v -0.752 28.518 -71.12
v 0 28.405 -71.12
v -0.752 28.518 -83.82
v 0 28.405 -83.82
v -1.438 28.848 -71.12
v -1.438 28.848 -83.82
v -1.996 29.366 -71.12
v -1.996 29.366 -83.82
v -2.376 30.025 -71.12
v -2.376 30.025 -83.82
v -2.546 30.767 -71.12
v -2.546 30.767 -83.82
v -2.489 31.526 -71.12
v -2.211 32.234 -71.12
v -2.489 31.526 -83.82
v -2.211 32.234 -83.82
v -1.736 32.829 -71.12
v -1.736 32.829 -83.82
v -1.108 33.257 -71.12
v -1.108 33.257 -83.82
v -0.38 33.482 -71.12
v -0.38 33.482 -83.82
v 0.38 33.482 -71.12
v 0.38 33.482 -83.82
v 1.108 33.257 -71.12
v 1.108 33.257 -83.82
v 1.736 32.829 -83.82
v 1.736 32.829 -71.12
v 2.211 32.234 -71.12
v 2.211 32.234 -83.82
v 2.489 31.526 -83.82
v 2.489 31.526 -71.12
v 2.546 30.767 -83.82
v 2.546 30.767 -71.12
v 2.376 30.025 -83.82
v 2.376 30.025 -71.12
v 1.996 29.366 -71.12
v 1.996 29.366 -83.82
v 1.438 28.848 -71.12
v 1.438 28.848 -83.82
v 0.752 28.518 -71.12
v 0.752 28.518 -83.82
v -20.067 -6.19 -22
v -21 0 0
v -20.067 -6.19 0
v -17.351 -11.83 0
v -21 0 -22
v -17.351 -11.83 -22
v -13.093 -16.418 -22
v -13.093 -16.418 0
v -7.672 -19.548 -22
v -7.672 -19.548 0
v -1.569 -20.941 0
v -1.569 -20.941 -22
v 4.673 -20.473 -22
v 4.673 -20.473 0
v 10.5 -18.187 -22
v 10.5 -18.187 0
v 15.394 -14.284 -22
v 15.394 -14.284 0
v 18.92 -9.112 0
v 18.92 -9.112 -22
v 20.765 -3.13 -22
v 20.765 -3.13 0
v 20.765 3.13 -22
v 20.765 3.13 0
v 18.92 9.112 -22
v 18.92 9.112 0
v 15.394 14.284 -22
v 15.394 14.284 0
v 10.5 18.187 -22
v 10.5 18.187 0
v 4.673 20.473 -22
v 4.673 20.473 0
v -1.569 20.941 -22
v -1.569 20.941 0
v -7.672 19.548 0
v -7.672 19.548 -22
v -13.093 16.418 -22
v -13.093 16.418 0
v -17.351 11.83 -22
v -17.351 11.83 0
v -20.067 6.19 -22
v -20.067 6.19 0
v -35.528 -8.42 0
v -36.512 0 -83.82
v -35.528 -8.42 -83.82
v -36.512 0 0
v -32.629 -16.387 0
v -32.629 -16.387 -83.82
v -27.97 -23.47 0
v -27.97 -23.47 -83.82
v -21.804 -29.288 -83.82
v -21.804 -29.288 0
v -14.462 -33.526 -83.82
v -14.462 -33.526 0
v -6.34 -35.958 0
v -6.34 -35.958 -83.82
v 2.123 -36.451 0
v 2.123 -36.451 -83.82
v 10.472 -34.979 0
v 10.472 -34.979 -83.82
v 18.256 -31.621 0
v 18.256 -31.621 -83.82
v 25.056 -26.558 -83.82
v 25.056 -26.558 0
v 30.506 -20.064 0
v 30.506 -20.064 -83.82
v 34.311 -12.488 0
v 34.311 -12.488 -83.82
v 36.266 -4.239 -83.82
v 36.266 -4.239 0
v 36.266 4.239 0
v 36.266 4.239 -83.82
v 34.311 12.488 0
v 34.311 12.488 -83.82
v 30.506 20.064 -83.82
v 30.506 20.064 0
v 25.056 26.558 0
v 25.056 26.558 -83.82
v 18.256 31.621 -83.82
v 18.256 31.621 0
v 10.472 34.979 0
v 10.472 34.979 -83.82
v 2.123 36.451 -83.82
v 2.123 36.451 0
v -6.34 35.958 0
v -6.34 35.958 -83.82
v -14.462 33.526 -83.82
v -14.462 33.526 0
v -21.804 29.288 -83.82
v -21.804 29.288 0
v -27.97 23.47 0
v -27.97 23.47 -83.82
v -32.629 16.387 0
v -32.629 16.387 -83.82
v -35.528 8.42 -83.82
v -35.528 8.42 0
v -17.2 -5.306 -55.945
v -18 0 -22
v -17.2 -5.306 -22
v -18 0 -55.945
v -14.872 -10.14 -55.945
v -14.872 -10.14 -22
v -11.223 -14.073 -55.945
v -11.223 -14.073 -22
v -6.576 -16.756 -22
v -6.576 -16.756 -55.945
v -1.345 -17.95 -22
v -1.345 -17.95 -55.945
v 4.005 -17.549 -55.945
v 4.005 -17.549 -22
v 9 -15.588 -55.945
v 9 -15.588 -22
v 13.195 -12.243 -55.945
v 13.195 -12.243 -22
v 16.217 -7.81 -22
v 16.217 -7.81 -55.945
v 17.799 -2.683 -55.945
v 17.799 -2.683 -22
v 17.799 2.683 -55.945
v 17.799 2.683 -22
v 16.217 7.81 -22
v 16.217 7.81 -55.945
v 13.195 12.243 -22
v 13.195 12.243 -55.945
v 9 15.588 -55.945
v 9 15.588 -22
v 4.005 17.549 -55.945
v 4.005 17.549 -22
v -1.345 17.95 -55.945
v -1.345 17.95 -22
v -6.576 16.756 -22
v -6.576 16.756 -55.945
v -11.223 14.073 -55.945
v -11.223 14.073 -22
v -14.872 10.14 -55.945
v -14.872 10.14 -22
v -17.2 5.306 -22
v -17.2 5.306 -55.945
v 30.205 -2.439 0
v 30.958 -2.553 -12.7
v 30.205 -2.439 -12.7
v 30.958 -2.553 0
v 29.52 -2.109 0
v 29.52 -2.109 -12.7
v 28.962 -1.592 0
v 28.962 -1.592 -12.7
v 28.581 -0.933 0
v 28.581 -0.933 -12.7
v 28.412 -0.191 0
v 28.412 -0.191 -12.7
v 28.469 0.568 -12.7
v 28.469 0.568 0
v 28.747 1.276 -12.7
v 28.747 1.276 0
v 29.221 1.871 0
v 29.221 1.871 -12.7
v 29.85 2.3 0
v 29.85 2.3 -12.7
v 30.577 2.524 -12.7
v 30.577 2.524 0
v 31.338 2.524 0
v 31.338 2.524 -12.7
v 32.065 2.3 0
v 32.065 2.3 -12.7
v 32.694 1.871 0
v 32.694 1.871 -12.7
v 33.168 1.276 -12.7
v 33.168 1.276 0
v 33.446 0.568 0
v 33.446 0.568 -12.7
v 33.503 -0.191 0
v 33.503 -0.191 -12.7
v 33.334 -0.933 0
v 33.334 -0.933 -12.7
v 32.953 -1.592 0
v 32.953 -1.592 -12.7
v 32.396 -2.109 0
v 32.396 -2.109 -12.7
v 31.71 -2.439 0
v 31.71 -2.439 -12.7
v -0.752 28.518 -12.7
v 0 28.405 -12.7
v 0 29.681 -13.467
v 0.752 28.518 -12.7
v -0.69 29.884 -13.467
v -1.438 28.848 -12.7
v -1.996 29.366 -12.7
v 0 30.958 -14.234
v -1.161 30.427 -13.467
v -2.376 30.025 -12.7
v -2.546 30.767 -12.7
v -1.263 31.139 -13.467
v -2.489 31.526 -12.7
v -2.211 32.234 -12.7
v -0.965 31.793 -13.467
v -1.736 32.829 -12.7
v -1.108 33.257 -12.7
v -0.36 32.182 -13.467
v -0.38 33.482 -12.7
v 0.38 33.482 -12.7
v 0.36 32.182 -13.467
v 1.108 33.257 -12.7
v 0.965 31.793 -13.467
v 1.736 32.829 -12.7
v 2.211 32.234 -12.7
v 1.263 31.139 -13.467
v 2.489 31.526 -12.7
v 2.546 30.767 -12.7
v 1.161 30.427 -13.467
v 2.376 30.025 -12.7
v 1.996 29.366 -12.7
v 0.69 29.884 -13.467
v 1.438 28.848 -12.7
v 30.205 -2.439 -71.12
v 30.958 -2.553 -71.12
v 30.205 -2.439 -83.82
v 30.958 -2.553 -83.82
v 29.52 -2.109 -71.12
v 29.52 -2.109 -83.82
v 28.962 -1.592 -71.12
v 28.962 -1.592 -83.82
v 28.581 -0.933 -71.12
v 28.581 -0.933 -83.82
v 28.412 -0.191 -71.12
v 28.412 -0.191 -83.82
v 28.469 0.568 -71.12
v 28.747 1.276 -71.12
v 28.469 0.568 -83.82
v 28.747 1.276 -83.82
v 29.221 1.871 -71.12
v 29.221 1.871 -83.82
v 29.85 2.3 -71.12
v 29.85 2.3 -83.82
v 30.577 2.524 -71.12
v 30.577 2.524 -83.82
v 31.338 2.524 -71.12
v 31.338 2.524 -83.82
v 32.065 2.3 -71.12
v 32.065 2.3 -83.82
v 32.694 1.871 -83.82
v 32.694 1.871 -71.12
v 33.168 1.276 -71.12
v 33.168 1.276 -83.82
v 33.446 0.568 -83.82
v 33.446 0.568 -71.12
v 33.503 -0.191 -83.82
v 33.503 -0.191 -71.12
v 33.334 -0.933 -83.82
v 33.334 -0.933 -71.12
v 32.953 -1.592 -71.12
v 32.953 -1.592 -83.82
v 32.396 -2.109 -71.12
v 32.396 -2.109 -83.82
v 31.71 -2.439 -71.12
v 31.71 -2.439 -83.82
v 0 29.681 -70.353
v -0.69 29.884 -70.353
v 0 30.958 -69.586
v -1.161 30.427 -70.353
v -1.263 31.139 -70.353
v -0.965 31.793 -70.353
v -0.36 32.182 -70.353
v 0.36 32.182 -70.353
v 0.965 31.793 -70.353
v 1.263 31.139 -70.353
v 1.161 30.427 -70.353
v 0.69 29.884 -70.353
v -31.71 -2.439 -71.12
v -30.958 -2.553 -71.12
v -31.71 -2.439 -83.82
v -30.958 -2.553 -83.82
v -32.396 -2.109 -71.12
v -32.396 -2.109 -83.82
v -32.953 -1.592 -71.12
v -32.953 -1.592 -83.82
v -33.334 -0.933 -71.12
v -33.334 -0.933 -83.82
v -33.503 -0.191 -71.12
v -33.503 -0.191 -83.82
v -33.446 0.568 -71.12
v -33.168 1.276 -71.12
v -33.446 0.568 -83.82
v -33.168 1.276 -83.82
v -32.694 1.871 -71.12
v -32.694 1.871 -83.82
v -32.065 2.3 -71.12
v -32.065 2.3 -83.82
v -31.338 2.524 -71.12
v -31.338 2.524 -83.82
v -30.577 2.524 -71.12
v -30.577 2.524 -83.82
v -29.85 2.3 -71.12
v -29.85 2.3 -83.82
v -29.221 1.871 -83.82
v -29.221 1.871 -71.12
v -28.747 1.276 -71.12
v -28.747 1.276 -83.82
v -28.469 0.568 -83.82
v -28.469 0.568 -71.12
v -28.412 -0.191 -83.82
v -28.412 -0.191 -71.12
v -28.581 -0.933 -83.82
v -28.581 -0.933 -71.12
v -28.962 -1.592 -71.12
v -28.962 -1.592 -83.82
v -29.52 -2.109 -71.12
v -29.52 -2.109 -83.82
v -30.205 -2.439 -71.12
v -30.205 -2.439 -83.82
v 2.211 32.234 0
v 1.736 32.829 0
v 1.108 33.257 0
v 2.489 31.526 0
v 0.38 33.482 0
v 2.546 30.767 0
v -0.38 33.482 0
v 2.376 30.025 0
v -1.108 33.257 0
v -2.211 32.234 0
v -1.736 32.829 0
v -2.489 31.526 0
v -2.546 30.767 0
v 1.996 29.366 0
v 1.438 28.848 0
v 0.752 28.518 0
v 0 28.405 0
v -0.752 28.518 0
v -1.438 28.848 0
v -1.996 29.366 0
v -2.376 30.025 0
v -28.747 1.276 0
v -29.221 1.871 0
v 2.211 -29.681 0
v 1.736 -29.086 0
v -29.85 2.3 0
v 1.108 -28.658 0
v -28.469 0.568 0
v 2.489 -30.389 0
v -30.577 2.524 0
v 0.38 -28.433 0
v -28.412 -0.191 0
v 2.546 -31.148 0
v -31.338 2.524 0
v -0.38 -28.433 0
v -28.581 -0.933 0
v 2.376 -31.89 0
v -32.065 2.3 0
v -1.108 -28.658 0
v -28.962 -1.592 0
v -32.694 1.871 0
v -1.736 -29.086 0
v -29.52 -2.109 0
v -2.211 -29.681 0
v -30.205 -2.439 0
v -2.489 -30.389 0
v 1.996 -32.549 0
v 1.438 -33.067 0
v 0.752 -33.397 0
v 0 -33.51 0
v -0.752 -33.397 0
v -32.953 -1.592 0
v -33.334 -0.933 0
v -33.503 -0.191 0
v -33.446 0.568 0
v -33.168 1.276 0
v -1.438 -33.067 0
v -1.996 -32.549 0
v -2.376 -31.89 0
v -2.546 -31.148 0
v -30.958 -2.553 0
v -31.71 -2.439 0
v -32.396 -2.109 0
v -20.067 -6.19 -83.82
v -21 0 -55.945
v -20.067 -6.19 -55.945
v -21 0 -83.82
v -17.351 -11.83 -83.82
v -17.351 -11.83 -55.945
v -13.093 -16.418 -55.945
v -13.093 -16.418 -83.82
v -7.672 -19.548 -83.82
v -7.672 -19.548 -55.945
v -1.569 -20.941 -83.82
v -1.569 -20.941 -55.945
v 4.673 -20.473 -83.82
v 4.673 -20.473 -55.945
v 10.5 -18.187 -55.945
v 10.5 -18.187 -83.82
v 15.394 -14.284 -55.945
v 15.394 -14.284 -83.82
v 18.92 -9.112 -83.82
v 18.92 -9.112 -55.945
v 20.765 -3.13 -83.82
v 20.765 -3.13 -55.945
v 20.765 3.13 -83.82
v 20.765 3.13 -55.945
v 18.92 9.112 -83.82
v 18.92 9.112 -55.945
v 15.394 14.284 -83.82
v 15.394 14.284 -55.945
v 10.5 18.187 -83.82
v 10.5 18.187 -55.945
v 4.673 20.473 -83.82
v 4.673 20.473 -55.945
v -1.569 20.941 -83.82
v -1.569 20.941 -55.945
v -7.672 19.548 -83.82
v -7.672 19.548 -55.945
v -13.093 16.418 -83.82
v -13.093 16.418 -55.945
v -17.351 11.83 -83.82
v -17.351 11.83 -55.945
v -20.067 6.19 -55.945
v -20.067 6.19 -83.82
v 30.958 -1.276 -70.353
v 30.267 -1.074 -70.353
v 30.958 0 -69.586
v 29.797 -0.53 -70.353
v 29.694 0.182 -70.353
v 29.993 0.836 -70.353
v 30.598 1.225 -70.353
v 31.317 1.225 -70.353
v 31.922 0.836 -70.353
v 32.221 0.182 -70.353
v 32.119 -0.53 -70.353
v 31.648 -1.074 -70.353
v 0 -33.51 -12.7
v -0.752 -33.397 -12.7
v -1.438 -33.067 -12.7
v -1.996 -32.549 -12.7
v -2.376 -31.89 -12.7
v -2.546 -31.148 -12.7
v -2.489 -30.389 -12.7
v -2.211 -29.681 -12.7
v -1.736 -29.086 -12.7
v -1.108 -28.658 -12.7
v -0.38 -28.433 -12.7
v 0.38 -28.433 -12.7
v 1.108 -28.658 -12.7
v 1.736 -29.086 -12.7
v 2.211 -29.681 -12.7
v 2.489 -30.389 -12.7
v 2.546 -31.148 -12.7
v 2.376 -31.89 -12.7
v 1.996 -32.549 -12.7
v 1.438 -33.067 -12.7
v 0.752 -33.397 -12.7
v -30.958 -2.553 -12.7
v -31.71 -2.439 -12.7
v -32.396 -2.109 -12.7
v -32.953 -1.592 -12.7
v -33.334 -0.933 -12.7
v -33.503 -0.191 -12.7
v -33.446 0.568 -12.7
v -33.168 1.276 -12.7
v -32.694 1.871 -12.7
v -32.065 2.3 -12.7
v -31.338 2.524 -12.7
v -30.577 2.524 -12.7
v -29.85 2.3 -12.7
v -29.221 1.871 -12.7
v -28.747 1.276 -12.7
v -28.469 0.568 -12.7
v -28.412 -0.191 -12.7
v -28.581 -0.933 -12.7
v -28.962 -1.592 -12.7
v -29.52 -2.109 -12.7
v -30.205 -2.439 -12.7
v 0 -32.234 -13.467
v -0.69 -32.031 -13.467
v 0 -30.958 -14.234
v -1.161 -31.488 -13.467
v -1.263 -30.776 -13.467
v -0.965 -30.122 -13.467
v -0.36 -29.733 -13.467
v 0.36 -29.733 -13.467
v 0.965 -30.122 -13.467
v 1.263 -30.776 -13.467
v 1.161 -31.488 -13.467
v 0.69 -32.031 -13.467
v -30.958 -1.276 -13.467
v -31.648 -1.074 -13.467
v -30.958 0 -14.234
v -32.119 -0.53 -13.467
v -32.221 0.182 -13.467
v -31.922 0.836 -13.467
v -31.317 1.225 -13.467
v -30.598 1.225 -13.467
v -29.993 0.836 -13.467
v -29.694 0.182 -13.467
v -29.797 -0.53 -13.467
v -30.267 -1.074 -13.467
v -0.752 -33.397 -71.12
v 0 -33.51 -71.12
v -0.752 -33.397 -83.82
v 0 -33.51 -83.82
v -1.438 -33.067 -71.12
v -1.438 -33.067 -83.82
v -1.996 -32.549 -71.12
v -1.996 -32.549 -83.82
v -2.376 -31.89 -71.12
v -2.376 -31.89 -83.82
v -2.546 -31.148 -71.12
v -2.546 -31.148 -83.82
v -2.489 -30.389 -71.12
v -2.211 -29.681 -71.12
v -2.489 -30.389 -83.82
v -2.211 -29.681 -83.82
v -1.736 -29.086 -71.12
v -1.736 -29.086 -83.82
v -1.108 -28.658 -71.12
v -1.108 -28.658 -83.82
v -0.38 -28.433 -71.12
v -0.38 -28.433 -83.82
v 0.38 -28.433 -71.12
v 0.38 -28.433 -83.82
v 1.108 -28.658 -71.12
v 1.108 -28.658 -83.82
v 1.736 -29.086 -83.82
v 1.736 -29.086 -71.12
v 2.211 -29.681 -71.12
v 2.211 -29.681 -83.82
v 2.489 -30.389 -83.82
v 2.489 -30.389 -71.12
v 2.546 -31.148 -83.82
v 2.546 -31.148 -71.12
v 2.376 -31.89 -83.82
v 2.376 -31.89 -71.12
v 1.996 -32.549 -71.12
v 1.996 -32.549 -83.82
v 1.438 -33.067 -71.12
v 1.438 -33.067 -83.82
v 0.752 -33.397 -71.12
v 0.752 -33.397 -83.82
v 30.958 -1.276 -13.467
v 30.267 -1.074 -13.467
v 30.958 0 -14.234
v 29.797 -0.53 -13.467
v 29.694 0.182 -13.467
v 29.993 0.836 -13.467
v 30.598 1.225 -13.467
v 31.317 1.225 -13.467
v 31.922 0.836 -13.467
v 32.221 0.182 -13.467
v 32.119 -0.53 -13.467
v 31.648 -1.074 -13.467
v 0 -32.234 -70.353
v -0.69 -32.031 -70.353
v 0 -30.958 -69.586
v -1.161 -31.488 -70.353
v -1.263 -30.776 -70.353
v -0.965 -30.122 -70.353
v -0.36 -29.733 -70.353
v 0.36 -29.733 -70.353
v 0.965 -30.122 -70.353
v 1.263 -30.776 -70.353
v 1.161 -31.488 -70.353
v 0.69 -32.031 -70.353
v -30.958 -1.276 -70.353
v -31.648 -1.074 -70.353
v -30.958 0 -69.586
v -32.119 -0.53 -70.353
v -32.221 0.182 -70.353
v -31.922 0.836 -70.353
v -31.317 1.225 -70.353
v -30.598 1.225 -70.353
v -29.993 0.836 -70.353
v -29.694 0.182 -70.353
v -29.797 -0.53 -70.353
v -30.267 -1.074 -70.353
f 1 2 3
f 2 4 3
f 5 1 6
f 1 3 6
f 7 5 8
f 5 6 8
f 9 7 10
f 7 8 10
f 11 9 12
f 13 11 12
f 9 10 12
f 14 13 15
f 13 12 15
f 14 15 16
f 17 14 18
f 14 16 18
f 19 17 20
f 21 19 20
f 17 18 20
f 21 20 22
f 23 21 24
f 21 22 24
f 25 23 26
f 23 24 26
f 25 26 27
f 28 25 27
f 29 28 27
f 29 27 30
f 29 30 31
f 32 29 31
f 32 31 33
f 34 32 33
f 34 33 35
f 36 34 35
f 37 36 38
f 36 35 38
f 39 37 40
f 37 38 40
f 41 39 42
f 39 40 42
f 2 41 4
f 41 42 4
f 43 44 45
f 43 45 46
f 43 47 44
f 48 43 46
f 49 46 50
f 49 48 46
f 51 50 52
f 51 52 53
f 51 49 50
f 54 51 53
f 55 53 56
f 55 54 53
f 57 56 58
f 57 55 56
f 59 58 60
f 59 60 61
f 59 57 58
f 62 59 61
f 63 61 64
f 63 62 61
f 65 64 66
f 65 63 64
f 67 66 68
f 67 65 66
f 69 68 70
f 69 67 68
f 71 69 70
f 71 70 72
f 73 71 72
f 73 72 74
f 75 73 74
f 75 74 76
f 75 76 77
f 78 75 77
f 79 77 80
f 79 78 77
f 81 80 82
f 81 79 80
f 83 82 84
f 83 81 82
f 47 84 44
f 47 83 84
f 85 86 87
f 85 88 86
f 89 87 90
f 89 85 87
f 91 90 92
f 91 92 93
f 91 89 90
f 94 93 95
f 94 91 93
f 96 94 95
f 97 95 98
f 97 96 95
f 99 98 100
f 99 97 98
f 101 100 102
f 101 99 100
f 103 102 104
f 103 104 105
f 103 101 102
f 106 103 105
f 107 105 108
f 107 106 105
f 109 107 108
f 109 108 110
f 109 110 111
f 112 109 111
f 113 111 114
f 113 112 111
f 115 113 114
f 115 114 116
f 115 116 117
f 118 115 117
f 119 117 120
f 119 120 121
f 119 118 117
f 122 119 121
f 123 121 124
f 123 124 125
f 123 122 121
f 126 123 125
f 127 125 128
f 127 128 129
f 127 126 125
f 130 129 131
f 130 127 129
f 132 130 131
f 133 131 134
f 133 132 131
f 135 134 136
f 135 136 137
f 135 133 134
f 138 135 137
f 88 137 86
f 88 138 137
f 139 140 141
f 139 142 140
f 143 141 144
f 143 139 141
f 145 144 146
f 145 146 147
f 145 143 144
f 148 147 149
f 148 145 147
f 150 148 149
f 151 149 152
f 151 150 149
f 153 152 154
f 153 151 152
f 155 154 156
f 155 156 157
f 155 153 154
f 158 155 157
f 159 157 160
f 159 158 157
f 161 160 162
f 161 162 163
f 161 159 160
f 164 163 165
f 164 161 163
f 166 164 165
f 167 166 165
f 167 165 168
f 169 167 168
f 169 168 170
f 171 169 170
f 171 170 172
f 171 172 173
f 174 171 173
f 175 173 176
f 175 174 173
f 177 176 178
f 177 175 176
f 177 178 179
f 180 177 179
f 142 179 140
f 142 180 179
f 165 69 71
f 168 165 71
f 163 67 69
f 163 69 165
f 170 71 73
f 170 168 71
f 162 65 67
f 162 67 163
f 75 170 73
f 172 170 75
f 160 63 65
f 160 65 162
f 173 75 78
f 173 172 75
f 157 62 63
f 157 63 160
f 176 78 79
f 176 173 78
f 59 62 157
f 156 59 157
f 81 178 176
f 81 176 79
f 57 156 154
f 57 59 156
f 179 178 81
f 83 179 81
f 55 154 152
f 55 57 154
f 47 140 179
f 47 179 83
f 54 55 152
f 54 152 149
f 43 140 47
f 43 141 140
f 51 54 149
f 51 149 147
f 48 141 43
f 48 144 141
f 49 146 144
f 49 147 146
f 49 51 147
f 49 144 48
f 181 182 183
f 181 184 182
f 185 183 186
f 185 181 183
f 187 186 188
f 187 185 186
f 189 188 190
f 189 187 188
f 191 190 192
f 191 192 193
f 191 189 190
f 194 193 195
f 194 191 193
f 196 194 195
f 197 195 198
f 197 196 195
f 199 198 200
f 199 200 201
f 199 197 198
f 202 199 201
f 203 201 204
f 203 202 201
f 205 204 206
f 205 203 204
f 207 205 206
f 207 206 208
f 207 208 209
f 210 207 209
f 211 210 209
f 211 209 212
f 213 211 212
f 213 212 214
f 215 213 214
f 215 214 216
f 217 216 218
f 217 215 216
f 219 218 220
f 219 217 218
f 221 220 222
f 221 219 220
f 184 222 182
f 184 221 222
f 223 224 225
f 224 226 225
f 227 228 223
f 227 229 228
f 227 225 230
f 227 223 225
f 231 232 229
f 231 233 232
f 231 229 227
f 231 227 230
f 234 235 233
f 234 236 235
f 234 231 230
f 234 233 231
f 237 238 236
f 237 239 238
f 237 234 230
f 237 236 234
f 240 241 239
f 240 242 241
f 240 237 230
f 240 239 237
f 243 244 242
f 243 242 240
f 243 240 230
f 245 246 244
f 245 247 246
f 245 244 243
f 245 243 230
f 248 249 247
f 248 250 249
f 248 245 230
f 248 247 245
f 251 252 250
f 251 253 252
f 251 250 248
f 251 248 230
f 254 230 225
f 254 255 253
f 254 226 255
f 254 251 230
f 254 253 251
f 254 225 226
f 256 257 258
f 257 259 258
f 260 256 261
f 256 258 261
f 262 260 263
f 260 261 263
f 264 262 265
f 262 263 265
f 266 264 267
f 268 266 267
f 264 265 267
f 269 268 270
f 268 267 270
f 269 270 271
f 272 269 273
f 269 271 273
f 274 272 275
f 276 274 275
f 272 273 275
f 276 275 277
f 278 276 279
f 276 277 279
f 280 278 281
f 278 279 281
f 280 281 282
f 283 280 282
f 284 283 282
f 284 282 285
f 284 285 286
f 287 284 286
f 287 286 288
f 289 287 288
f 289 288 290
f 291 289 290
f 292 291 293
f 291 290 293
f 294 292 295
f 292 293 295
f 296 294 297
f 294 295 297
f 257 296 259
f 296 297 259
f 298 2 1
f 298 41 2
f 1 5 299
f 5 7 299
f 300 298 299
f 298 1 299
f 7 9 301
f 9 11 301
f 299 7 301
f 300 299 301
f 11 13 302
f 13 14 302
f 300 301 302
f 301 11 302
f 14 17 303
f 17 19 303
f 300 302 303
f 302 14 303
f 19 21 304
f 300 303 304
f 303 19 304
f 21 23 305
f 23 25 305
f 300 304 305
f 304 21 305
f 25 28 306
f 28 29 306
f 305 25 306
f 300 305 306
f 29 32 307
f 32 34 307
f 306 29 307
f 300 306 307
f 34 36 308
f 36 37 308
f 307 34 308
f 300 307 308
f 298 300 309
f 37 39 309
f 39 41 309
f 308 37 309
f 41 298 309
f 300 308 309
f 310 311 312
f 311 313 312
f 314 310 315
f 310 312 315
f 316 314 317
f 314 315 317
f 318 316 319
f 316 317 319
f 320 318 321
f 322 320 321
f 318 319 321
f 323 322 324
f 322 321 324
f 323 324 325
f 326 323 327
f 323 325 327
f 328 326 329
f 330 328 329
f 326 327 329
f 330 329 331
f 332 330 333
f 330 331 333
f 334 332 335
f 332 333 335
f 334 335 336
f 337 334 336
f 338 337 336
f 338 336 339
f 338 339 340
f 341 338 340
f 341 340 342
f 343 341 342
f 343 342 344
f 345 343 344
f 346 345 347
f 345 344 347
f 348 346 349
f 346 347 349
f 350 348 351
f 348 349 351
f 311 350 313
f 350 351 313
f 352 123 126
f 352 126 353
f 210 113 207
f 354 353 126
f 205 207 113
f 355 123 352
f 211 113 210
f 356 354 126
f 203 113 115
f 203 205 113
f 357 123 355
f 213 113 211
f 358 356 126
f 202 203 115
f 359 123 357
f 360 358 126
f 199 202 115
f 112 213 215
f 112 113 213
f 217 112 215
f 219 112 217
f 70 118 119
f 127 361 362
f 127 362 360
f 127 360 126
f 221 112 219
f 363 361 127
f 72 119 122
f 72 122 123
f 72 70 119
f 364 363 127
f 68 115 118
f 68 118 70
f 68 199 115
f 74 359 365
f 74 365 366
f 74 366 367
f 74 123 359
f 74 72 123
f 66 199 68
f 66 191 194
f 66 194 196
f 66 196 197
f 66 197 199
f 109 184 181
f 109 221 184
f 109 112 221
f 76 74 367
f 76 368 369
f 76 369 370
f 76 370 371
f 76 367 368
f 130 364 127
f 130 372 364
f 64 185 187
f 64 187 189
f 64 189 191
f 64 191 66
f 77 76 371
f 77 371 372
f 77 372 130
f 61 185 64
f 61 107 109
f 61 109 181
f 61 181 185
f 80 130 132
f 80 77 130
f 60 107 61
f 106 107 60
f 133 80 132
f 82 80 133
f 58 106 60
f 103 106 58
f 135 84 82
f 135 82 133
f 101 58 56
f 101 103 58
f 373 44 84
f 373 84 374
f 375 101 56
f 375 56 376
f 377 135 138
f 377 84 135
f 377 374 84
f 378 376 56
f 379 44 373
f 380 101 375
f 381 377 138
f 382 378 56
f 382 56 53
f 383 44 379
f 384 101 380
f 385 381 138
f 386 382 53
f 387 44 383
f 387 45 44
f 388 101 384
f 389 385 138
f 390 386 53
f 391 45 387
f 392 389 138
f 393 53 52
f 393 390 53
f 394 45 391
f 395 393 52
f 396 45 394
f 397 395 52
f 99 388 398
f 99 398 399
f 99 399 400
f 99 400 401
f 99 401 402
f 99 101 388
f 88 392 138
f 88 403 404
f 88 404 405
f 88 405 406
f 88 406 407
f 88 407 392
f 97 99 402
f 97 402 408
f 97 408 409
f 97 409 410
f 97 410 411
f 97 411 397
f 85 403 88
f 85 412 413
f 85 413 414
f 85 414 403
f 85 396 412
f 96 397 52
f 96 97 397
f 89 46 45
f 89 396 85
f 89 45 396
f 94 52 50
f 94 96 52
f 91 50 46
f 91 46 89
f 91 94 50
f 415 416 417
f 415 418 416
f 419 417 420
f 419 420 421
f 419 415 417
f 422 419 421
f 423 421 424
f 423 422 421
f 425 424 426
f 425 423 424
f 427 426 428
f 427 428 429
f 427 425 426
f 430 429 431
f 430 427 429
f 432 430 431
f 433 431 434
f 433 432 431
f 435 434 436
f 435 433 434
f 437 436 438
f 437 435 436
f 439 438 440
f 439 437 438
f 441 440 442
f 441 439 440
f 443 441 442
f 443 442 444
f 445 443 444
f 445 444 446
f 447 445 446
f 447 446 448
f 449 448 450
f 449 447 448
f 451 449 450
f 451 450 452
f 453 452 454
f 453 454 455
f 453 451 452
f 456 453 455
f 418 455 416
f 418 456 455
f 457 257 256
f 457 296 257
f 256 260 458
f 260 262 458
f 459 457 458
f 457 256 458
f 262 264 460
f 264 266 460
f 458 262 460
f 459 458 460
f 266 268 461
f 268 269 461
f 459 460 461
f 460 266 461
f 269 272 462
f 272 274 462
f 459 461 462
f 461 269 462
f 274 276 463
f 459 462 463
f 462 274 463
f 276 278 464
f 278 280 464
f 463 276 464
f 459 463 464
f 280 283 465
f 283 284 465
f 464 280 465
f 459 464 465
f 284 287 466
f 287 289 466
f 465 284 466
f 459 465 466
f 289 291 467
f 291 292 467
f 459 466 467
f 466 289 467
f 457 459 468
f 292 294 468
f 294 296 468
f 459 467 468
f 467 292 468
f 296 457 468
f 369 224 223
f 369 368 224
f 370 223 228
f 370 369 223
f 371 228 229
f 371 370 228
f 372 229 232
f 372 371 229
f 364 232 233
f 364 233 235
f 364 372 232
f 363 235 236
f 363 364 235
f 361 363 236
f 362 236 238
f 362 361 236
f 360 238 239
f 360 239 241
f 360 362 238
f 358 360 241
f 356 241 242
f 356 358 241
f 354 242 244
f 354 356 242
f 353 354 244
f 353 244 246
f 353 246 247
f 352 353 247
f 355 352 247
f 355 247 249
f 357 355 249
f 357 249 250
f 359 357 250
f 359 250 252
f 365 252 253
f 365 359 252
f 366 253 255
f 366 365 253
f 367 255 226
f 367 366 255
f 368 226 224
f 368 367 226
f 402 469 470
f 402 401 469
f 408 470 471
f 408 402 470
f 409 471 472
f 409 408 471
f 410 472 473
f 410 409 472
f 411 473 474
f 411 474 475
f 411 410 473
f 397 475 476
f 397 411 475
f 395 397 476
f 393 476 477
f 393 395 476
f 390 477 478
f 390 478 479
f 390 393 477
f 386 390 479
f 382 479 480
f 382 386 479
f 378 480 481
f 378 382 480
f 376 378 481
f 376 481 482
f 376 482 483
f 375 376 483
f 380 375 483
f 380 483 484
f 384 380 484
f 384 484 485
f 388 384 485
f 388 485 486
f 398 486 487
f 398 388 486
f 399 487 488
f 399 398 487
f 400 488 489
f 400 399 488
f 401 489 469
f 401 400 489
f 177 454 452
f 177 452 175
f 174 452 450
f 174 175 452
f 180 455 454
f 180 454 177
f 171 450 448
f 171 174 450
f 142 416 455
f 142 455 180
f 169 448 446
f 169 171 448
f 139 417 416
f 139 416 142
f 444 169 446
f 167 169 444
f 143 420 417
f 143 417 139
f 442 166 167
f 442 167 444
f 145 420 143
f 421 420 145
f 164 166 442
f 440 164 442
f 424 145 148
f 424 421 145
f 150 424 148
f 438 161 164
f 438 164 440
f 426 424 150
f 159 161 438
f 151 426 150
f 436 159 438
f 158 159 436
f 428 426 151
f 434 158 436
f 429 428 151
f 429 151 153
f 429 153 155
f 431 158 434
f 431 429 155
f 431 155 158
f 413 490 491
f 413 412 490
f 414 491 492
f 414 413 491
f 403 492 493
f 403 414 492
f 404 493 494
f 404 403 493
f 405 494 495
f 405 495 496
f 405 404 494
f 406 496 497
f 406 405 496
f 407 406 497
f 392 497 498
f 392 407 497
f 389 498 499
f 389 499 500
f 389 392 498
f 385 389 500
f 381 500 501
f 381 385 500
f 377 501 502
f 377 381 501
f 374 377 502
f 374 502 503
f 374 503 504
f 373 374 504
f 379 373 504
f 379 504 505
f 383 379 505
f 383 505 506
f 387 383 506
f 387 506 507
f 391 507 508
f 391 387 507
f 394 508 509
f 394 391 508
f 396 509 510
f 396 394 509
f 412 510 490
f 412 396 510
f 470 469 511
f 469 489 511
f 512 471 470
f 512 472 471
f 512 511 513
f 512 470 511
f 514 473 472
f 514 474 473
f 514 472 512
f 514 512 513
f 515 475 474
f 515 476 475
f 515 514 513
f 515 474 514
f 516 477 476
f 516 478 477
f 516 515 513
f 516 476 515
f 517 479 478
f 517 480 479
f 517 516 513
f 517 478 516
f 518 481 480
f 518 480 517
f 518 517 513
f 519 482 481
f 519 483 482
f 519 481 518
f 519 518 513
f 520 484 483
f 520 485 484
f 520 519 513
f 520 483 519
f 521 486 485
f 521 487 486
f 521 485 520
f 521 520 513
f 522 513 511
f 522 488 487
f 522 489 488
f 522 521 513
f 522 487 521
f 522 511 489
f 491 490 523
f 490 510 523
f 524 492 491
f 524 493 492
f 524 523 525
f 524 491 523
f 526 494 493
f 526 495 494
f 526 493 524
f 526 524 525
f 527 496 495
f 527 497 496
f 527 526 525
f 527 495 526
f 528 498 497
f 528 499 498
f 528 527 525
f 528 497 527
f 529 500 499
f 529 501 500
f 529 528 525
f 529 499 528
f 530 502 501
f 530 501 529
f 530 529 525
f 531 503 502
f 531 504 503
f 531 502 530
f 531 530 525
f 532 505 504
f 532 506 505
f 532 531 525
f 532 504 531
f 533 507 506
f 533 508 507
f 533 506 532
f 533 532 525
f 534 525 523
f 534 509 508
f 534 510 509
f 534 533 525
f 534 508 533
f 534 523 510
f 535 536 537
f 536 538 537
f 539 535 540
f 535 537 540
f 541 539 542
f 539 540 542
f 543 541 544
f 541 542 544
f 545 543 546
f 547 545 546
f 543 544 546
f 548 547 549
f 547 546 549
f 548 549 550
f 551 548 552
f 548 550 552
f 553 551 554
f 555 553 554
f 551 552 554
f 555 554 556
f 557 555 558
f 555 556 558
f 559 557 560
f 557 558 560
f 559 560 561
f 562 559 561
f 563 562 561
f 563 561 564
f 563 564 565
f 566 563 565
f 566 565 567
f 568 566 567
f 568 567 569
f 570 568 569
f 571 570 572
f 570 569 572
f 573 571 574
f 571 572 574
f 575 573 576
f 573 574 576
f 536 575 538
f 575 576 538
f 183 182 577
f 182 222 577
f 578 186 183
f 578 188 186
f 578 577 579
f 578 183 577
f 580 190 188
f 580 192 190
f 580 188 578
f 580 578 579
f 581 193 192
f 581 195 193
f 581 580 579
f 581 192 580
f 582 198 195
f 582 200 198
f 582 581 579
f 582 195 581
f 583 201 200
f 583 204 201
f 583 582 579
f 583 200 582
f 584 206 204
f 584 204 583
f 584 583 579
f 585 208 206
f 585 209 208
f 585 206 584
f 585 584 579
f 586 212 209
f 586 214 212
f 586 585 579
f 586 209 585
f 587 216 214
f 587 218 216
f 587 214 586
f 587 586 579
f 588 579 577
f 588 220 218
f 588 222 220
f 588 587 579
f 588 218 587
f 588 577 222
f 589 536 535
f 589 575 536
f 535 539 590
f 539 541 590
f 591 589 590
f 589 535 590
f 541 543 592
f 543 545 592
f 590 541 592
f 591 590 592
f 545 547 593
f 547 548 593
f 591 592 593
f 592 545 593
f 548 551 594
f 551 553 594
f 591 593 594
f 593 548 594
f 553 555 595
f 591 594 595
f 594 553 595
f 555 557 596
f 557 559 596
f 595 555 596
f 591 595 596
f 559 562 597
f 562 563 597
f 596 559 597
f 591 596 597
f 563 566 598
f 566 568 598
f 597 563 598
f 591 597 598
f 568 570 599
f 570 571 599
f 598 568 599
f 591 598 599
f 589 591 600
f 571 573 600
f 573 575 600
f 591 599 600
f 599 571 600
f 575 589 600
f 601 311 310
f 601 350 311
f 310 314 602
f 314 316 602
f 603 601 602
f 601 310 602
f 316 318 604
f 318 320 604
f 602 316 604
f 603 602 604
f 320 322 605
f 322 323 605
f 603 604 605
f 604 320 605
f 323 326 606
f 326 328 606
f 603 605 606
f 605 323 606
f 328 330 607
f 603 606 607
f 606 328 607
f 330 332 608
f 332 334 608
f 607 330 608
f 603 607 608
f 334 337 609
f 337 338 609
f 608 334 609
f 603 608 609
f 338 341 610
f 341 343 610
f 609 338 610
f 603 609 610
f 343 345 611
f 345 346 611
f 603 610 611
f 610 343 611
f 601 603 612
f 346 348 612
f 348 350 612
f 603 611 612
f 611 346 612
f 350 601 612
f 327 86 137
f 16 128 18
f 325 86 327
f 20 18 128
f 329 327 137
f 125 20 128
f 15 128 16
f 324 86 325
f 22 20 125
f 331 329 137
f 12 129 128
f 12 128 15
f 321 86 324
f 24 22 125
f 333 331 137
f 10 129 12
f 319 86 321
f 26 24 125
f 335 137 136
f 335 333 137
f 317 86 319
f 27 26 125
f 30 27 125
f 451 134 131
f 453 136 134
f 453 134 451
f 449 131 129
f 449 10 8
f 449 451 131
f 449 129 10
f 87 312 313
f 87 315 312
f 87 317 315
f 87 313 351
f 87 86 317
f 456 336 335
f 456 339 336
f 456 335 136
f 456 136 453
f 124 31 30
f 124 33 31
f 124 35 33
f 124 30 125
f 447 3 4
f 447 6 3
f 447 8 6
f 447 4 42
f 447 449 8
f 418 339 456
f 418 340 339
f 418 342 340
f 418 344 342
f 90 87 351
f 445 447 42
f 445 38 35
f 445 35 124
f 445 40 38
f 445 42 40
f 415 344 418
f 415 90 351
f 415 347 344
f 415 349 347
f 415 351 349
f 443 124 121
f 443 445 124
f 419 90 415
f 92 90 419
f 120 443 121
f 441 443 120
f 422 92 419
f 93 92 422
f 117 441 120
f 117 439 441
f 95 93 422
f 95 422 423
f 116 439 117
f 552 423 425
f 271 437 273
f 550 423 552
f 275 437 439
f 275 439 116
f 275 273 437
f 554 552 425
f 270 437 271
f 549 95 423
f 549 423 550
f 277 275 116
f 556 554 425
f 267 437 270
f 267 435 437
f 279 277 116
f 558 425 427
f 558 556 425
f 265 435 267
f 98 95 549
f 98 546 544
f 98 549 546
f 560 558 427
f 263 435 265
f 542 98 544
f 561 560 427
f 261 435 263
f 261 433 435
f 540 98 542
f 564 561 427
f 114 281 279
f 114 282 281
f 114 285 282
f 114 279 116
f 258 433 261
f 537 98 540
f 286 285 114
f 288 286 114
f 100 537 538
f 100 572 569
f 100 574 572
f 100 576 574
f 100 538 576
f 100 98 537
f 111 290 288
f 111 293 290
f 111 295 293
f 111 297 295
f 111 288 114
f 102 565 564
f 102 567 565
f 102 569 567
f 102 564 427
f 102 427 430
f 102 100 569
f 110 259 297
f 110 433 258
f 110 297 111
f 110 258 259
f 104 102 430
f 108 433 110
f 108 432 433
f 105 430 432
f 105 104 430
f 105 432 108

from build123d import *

# Parameters (mm, degrees)
TAP_DRILL_FOR_1_4_20_TAP2_AT_2_COUNT = 2
TAP_DRILL_FOR_1_4_20_TAP2_AT_2_PITCH = 43.780544641
TAP_DRILL_FOR_1_4_20_TAP2_AT_3_COUNT = 2
TAP_DRILL_FOR_1_4_20_TAP2_AT_3_PITCH = 61.91504
TAP_DRILL_FOR_1_4_20_TAP2_AT_4_COUNT = 2
TAP_DRILL_FOR_1_4_20_TAP2_AT_4_PITCH = 43.780544641


with BuildPart() as part:
    # Housing Sketch → Housing Revolve (revolve)
    with BuildSketch(Plane(origin=(0, 0, 0), x_dir=(0, 0, -1), z_dir=(1, 0, 0)), mode=Mode.PRIVATE) as housing_revolve_sk:
        Polygon((83.82, 36.5125), (0, 36.5125), (0, 21), (22, 21), (22, 18), (55.945, 18), (55.945, 21), (83.82, 21), align=None)
    revolve(housing_revolve_sk.sketch.rotate(Axis((0, 0, -141.5522592), (0, 0, 1)), 90), axis=Axis((0, 0, -141.5522592), (0, 0, 1)))

    # Sketch8 → Tap Drill for 1/4-20 Tap2 (revolve, cut)
    with BuildSketch(Plane(origin=(0, 30.95752, 0), x_dir=(0, -1, 0), z_dir=(1, 0, 0))):
        Polygon((0, 0), (0, 14.233816902), (2.5527, 12.7), (2.5527, 0), align=None)
    tap_drill_for_1_4_20_tap2 = revolve(axis=Axis((0, 30.95752, 6.35), (0, 0, -1)), mode=Mode.SUBTRACT)

    # Tap Drill for 1/4-20 Tap2 at 2: Tap Drill for 1/4-20 Tap2 ×2
    with Locations(*[Vector(0.7071067811865476, -0.7071067811865476, 0) * (i * TAP_DRILL_FOR_1_4_20_TAP2_AT_2_PITCH) for i in range(1, TAP_DRILL_FOR_1_4_20_TAP2_AT_2_COUNT)]):
        add(tap_drill_for_1_4_20_tap2, mode=Mode.SUBTRACT)

    # Tap Drill for 1/4-20 Tap2 at 3: Tap Drill for 1/4-20 Tap2 ×2
    with Locations(*[(0, -i * TAP_DRILL_FOR_1_4_20_TAP2_AT_3_PITCH, 0) for i in range(1, TAP_DRILL_FOR_1_4_20_TAP2_AT_3_COUNT)]):
        add(tap_drill_for_1_4_20_tap2, mode=Mode.SUBTRACT)

    # Tap Drill for 1/4-20 Tap2 at 4: Tap Drill for 1/4-20 Tap2 ×2
    with Locations(*[Vector(-0.7071067811865476, -0.7071067811865476, 0) * (i * TAP_DRILL_FOR_1_4_20_TAP2_AT_4_PITCH) for i in range(1, TAP_DRILL_FOR_1_4_20_TAP2_AT_4_COUNT)]):
        add(tap_drill_for_1_4_20_tap2, mode=Mode.SUBTRACT)

    # Mirror1: Tap Drill for 1/4-20 Tap2 across plane
    add(tap_drill_for_1_4_20_tap2.mirror(Plane(origin=(0, 0, -41.91), x_dir=(1, 0, 0), z_dir=(0, 0, -1))), mode=Mode.SUBTRACT)

    # Mirror1 copy 1 sketch → Mirror1 copy 1 (revolve, cut)
    with BuildSketch(Plane(origin=(30.95752, 0, -83.82), x_dir=(0, -1, 0), z_dir=(1, 0, 0))):
        Polygon((0, 0), (0, -14.233816902), (2.5527, -12.7), (2.5527, 0), align=None)
    revolve(axis=Axis((30.95752, 0, -90.17), (0, 0, -1)), mode=Mode.SUBTRACT)

    # Mirror1 copy 2 sketch → Mirror1 copy 2 (revolve, cut)
    with BuildSketch(Plane(origin=(0, -30.95752, -83.82), x_dir=(0, -1, 0), z_dir=(1, 0, 0))):
        Polygon((0, 0), (0, -14.233816902), (2.5527, -12.7), (2.5527, 0), align=None)
    revolve(axis=Axis((0, -30.95752, -90.17), (0, 0, -1)), mode=Mode.SUBTRACT)

    # Mirror1 copy 3 sketch → Mirror1 copy 3 (revolve, cut)
    with BuildSketch(Plane(origin=(-30.95752, 0, -83.82), x_dir=(0, -1, 0), z_dir=(1, 0, 0))):
        Polygon((0, 0), (0, -14.233816902), (2.5527, -12.7), (2.5527, 0), align=None)
    revolve(axis=Axis((-30.95752, 0, -90.17), (0, 0, -1)), mode=Mode.SUBTRACT)


solid = part.part
